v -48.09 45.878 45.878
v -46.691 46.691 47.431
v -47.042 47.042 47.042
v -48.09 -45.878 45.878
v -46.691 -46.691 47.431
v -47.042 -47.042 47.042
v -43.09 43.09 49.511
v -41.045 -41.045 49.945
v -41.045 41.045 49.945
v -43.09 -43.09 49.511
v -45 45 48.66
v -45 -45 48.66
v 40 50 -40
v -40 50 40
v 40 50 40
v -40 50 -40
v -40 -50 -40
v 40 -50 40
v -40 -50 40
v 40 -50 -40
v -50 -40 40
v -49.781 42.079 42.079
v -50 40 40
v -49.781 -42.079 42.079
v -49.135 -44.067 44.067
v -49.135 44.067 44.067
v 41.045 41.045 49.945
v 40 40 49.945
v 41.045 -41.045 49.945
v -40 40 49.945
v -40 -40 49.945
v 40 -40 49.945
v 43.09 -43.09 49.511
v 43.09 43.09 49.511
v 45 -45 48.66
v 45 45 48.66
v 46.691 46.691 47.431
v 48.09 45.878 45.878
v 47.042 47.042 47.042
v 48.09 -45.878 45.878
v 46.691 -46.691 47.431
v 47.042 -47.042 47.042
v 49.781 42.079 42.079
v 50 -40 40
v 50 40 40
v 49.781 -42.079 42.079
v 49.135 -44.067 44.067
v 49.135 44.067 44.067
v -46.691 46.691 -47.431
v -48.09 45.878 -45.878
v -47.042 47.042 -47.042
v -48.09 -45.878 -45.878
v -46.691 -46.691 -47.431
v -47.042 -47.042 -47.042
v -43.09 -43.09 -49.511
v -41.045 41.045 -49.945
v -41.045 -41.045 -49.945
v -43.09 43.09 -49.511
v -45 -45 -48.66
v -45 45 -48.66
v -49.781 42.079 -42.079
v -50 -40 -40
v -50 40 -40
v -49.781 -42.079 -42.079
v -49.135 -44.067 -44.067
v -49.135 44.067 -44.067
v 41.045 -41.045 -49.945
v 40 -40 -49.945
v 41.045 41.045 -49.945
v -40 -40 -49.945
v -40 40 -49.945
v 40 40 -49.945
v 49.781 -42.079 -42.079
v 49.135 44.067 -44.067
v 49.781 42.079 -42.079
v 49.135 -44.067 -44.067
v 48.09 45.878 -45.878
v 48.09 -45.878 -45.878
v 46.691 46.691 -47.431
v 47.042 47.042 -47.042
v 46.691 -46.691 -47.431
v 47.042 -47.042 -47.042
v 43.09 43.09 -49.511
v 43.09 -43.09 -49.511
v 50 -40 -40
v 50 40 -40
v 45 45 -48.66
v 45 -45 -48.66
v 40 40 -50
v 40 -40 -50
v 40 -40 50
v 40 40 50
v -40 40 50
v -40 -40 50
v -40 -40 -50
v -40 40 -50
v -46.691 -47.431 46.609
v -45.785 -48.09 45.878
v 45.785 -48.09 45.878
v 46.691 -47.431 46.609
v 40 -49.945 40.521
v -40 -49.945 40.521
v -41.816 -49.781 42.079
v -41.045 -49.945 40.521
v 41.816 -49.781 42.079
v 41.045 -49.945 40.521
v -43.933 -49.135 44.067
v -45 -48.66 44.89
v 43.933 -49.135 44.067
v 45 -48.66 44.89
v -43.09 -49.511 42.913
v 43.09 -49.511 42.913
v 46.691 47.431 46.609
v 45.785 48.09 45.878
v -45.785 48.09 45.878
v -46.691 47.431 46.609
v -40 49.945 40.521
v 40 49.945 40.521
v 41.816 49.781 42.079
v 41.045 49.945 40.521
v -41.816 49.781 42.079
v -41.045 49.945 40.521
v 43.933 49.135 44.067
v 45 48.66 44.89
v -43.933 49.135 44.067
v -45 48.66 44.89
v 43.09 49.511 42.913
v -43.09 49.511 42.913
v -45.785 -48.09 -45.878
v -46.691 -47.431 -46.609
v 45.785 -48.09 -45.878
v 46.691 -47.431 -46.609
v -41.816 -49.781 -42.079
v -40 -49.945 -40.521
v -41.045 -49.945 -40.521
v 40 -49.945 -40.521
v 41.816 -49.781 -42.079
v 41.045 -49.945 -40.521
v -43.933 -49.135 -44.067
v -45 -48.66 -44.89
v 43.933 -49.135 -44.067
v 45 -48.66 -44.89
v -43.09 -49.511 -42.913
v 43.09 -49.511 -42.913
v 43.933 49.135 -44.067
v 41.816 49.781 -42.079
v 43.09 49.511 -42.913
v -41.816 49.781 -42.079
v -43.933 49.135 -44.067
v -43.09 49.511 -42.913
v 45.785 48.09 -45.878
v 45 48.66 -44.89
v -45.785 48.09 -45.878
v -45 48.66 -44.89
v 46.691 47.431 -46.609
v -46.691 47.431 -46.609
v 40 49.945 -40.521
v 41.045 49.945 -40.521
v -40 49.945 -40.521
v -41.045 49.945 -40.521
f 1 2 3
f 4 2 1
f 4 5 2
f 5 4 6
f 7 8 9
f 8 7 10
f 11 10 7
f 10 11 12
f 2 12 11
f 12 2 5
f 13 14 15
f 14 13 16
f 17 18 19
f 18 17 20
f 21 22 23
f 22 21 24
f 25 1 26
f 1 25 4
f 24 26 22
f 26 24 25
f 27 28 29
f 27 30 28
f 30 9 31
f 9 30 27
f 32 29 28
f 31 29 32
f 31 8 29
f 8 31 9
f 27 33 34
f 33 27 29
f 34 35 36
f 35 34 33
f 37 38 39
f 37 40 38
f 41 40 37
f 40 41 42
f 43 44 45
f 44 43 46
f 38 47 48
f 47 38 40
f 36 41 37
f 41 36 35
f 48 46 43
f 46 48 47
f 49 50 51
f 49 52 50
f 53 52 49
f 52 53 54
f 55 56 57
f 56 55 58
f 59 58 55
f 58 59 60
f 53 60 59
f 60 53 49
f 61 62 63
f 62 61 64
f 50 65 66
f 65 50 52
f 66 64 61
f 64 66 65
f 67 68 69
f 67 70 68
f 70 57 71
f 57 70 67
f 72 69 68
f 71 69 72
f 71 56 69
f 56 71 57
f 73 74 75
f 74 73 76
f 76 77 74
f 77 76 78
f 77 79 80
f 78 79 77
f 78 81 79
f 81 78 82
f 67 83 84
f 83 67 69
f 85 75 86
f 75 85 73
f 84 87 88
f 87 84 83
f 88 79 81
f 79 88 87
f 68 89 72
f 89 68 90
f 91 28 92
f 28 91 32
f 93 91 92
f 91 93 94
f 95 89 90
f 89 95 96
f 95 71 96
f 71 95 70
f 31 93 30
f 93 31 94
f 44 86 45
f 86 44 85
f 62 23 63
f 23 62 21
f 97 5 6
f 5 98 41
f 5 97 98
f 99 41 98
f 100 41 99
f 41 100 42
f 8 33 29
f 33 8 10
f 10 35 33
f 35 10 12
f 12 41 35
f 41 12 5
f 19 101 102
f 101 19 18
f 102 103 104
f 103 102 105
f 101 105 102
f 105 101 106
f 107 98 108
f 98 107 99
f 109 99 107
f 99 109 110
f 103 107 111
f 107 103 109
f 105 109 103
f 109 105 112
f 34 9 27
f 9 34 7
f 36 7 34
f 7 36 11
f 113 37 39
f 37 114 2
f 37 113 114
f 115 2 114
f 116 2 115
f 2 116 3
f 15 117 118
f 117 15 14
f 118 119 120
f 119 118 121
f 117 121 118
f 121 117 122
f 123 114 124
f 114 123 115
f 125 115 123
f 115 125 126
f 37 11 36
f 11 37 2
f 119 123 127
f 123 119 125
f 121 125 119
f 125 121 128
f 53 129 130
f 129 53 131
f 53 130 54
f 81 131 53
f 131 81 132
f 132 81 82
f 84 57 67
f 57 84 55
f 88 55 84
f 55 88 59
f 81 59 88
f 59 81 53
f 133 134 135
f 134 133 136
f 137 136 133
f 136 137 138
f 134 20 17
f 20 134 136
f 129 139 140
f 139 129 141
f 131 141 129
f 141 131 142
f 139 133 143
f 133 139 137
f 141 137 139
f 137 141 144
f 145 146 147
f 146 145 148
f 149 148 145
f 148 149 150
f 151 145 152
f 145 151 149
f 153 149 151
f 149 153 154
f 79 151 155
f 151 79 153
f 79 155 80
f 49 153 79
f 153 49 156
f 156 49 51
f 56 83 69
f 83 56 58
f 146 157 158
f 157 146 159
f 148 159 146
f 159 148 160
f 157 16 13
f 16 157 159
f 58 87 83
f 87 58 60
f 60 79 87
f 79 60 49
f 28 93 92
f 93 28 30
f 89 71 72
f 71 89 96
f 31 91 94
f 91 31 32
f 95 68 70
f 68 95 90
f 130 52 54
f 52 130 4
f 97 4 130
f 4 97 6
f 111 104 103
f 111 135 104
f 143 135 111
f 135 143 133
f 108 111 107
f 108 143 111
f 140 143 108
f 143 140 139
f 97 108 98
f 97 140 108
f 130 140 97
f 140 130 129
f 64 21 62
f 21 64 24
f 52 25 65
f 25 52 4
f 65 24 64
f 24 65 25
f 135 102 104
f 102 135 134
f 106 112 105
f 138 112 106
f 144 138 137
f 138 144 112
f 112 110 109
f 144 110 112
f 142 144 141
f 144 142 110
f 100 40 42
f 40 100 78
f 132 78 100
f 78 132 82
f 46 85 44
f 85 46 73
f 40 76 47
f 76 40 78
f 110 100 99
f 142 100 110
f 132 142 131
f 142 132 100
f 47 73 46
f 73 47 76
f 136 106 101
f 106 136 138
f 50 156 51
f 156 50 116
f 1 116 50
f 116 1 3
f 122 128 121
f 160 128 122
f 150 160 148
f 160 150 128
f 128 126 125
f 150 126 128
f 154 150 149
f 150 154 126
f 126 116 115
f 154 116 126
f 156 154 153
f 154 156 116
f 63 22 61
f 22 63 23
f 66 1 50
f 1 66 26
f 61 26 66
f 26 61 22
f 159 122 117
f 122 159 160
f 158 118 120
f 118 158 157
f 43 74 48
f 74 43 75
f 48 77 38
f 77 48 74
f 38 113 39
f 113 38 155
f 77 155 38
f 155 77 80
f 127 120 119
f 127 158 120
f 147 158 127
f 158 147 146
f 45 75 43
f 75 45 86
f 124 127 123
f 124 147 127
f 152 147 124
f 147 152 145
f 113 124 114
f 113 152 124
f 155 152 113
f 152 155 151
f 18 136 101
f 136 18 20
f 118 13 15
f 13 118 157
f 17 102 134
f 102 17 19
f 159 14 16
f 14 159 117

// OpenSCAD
// file: holes.scad
module countersunk_hole(h, d, r_inner, r_outer, center=true) {
  centroid = center ? [0, 0, 0] : [r_outer, r_outer, h / 2];
  translate(centroid) {
    translate([0, 0, (h - d) / 2]) cylinder(r=r_outer, h=d + 1, center=true);
    cylinder(r=r_inner, h=h + 1, center=true);
  }
}

module circle_mount(r_mount, r_hole, h) {
  translate([0, r_mount, 0]) cylinder(r=r_hole, h=h + 1, center=true);
  translate([0, -r_mount, 0]) cylinder(r=r_hole, h=h + 1, center=true);
  translate([r_mount, 0, 0]) cylinder(r=r_hole, h=h + 1, center=true);
  translate([-r_mount, 0, 0]) cylinder(r=r_hole, h=h + 1, center=true);
}

module square_mount(r_mount, r_hole, h) {
  translate([r_mount, r_mount, 0]) cylinder(r=r_hole, h=h + 1, center=true);
  translate([r_mount, -r_mount, 0]) cylinder(r=r_hole, h=h + 1, center=true);
  translate([-r_mount, r_mount, 0]) cylinder(r=r_hole, h=h + 1, center=true);
  translate([-r_mount, -r_mount, 0]) cylinder(r=r_hole, h=h + 1, center=true);
}

module mirror_drilling(axis=[1, 0, 0]) {
  children();
  mirror(axis) children();
}

module quad_drilling(axis=[0, 0, 1]) {
  children();
  mirror([1, 0, 0]) children();
  mirror(axis) {
    children();
    mirror([1, 0, 0]) children();
  }
}
// main file
use <holes.scad>;

module rounded_cube_single(w, l, h, r) {
  d = r * 2;
  
  union() {
    cube([w - d, l, h], center=true);
    cube([w, l, h - d], center=true);
    quad_drilling() translate([-w/2 + r, 0, -h/2 + r]) rotate([90, 0, 0]) cylinder(r=r, h=l, center=true);
  }
}

module rounded_cube(size, r, apply_to="x", center=true) {
  w = size[0];
  l = size[1];
  h = size[2];

  intersection() {
    if (search("x", apply_to)) {
      rounded_cube_single(w, l, h, r);
    }
    if (search("y", apply_to)) {
      rotate([0, 0, 90]) rounded_cube_single(w, l, h, r);
    }
    if (search("z", apply_to)) {
      rotate([90, 0, 0]) rounded_cube_single(w, l, h, r);
    }
  }
}

rounded_cube([100, 100, 100], r=10, apply_to="xyz", center=true);
